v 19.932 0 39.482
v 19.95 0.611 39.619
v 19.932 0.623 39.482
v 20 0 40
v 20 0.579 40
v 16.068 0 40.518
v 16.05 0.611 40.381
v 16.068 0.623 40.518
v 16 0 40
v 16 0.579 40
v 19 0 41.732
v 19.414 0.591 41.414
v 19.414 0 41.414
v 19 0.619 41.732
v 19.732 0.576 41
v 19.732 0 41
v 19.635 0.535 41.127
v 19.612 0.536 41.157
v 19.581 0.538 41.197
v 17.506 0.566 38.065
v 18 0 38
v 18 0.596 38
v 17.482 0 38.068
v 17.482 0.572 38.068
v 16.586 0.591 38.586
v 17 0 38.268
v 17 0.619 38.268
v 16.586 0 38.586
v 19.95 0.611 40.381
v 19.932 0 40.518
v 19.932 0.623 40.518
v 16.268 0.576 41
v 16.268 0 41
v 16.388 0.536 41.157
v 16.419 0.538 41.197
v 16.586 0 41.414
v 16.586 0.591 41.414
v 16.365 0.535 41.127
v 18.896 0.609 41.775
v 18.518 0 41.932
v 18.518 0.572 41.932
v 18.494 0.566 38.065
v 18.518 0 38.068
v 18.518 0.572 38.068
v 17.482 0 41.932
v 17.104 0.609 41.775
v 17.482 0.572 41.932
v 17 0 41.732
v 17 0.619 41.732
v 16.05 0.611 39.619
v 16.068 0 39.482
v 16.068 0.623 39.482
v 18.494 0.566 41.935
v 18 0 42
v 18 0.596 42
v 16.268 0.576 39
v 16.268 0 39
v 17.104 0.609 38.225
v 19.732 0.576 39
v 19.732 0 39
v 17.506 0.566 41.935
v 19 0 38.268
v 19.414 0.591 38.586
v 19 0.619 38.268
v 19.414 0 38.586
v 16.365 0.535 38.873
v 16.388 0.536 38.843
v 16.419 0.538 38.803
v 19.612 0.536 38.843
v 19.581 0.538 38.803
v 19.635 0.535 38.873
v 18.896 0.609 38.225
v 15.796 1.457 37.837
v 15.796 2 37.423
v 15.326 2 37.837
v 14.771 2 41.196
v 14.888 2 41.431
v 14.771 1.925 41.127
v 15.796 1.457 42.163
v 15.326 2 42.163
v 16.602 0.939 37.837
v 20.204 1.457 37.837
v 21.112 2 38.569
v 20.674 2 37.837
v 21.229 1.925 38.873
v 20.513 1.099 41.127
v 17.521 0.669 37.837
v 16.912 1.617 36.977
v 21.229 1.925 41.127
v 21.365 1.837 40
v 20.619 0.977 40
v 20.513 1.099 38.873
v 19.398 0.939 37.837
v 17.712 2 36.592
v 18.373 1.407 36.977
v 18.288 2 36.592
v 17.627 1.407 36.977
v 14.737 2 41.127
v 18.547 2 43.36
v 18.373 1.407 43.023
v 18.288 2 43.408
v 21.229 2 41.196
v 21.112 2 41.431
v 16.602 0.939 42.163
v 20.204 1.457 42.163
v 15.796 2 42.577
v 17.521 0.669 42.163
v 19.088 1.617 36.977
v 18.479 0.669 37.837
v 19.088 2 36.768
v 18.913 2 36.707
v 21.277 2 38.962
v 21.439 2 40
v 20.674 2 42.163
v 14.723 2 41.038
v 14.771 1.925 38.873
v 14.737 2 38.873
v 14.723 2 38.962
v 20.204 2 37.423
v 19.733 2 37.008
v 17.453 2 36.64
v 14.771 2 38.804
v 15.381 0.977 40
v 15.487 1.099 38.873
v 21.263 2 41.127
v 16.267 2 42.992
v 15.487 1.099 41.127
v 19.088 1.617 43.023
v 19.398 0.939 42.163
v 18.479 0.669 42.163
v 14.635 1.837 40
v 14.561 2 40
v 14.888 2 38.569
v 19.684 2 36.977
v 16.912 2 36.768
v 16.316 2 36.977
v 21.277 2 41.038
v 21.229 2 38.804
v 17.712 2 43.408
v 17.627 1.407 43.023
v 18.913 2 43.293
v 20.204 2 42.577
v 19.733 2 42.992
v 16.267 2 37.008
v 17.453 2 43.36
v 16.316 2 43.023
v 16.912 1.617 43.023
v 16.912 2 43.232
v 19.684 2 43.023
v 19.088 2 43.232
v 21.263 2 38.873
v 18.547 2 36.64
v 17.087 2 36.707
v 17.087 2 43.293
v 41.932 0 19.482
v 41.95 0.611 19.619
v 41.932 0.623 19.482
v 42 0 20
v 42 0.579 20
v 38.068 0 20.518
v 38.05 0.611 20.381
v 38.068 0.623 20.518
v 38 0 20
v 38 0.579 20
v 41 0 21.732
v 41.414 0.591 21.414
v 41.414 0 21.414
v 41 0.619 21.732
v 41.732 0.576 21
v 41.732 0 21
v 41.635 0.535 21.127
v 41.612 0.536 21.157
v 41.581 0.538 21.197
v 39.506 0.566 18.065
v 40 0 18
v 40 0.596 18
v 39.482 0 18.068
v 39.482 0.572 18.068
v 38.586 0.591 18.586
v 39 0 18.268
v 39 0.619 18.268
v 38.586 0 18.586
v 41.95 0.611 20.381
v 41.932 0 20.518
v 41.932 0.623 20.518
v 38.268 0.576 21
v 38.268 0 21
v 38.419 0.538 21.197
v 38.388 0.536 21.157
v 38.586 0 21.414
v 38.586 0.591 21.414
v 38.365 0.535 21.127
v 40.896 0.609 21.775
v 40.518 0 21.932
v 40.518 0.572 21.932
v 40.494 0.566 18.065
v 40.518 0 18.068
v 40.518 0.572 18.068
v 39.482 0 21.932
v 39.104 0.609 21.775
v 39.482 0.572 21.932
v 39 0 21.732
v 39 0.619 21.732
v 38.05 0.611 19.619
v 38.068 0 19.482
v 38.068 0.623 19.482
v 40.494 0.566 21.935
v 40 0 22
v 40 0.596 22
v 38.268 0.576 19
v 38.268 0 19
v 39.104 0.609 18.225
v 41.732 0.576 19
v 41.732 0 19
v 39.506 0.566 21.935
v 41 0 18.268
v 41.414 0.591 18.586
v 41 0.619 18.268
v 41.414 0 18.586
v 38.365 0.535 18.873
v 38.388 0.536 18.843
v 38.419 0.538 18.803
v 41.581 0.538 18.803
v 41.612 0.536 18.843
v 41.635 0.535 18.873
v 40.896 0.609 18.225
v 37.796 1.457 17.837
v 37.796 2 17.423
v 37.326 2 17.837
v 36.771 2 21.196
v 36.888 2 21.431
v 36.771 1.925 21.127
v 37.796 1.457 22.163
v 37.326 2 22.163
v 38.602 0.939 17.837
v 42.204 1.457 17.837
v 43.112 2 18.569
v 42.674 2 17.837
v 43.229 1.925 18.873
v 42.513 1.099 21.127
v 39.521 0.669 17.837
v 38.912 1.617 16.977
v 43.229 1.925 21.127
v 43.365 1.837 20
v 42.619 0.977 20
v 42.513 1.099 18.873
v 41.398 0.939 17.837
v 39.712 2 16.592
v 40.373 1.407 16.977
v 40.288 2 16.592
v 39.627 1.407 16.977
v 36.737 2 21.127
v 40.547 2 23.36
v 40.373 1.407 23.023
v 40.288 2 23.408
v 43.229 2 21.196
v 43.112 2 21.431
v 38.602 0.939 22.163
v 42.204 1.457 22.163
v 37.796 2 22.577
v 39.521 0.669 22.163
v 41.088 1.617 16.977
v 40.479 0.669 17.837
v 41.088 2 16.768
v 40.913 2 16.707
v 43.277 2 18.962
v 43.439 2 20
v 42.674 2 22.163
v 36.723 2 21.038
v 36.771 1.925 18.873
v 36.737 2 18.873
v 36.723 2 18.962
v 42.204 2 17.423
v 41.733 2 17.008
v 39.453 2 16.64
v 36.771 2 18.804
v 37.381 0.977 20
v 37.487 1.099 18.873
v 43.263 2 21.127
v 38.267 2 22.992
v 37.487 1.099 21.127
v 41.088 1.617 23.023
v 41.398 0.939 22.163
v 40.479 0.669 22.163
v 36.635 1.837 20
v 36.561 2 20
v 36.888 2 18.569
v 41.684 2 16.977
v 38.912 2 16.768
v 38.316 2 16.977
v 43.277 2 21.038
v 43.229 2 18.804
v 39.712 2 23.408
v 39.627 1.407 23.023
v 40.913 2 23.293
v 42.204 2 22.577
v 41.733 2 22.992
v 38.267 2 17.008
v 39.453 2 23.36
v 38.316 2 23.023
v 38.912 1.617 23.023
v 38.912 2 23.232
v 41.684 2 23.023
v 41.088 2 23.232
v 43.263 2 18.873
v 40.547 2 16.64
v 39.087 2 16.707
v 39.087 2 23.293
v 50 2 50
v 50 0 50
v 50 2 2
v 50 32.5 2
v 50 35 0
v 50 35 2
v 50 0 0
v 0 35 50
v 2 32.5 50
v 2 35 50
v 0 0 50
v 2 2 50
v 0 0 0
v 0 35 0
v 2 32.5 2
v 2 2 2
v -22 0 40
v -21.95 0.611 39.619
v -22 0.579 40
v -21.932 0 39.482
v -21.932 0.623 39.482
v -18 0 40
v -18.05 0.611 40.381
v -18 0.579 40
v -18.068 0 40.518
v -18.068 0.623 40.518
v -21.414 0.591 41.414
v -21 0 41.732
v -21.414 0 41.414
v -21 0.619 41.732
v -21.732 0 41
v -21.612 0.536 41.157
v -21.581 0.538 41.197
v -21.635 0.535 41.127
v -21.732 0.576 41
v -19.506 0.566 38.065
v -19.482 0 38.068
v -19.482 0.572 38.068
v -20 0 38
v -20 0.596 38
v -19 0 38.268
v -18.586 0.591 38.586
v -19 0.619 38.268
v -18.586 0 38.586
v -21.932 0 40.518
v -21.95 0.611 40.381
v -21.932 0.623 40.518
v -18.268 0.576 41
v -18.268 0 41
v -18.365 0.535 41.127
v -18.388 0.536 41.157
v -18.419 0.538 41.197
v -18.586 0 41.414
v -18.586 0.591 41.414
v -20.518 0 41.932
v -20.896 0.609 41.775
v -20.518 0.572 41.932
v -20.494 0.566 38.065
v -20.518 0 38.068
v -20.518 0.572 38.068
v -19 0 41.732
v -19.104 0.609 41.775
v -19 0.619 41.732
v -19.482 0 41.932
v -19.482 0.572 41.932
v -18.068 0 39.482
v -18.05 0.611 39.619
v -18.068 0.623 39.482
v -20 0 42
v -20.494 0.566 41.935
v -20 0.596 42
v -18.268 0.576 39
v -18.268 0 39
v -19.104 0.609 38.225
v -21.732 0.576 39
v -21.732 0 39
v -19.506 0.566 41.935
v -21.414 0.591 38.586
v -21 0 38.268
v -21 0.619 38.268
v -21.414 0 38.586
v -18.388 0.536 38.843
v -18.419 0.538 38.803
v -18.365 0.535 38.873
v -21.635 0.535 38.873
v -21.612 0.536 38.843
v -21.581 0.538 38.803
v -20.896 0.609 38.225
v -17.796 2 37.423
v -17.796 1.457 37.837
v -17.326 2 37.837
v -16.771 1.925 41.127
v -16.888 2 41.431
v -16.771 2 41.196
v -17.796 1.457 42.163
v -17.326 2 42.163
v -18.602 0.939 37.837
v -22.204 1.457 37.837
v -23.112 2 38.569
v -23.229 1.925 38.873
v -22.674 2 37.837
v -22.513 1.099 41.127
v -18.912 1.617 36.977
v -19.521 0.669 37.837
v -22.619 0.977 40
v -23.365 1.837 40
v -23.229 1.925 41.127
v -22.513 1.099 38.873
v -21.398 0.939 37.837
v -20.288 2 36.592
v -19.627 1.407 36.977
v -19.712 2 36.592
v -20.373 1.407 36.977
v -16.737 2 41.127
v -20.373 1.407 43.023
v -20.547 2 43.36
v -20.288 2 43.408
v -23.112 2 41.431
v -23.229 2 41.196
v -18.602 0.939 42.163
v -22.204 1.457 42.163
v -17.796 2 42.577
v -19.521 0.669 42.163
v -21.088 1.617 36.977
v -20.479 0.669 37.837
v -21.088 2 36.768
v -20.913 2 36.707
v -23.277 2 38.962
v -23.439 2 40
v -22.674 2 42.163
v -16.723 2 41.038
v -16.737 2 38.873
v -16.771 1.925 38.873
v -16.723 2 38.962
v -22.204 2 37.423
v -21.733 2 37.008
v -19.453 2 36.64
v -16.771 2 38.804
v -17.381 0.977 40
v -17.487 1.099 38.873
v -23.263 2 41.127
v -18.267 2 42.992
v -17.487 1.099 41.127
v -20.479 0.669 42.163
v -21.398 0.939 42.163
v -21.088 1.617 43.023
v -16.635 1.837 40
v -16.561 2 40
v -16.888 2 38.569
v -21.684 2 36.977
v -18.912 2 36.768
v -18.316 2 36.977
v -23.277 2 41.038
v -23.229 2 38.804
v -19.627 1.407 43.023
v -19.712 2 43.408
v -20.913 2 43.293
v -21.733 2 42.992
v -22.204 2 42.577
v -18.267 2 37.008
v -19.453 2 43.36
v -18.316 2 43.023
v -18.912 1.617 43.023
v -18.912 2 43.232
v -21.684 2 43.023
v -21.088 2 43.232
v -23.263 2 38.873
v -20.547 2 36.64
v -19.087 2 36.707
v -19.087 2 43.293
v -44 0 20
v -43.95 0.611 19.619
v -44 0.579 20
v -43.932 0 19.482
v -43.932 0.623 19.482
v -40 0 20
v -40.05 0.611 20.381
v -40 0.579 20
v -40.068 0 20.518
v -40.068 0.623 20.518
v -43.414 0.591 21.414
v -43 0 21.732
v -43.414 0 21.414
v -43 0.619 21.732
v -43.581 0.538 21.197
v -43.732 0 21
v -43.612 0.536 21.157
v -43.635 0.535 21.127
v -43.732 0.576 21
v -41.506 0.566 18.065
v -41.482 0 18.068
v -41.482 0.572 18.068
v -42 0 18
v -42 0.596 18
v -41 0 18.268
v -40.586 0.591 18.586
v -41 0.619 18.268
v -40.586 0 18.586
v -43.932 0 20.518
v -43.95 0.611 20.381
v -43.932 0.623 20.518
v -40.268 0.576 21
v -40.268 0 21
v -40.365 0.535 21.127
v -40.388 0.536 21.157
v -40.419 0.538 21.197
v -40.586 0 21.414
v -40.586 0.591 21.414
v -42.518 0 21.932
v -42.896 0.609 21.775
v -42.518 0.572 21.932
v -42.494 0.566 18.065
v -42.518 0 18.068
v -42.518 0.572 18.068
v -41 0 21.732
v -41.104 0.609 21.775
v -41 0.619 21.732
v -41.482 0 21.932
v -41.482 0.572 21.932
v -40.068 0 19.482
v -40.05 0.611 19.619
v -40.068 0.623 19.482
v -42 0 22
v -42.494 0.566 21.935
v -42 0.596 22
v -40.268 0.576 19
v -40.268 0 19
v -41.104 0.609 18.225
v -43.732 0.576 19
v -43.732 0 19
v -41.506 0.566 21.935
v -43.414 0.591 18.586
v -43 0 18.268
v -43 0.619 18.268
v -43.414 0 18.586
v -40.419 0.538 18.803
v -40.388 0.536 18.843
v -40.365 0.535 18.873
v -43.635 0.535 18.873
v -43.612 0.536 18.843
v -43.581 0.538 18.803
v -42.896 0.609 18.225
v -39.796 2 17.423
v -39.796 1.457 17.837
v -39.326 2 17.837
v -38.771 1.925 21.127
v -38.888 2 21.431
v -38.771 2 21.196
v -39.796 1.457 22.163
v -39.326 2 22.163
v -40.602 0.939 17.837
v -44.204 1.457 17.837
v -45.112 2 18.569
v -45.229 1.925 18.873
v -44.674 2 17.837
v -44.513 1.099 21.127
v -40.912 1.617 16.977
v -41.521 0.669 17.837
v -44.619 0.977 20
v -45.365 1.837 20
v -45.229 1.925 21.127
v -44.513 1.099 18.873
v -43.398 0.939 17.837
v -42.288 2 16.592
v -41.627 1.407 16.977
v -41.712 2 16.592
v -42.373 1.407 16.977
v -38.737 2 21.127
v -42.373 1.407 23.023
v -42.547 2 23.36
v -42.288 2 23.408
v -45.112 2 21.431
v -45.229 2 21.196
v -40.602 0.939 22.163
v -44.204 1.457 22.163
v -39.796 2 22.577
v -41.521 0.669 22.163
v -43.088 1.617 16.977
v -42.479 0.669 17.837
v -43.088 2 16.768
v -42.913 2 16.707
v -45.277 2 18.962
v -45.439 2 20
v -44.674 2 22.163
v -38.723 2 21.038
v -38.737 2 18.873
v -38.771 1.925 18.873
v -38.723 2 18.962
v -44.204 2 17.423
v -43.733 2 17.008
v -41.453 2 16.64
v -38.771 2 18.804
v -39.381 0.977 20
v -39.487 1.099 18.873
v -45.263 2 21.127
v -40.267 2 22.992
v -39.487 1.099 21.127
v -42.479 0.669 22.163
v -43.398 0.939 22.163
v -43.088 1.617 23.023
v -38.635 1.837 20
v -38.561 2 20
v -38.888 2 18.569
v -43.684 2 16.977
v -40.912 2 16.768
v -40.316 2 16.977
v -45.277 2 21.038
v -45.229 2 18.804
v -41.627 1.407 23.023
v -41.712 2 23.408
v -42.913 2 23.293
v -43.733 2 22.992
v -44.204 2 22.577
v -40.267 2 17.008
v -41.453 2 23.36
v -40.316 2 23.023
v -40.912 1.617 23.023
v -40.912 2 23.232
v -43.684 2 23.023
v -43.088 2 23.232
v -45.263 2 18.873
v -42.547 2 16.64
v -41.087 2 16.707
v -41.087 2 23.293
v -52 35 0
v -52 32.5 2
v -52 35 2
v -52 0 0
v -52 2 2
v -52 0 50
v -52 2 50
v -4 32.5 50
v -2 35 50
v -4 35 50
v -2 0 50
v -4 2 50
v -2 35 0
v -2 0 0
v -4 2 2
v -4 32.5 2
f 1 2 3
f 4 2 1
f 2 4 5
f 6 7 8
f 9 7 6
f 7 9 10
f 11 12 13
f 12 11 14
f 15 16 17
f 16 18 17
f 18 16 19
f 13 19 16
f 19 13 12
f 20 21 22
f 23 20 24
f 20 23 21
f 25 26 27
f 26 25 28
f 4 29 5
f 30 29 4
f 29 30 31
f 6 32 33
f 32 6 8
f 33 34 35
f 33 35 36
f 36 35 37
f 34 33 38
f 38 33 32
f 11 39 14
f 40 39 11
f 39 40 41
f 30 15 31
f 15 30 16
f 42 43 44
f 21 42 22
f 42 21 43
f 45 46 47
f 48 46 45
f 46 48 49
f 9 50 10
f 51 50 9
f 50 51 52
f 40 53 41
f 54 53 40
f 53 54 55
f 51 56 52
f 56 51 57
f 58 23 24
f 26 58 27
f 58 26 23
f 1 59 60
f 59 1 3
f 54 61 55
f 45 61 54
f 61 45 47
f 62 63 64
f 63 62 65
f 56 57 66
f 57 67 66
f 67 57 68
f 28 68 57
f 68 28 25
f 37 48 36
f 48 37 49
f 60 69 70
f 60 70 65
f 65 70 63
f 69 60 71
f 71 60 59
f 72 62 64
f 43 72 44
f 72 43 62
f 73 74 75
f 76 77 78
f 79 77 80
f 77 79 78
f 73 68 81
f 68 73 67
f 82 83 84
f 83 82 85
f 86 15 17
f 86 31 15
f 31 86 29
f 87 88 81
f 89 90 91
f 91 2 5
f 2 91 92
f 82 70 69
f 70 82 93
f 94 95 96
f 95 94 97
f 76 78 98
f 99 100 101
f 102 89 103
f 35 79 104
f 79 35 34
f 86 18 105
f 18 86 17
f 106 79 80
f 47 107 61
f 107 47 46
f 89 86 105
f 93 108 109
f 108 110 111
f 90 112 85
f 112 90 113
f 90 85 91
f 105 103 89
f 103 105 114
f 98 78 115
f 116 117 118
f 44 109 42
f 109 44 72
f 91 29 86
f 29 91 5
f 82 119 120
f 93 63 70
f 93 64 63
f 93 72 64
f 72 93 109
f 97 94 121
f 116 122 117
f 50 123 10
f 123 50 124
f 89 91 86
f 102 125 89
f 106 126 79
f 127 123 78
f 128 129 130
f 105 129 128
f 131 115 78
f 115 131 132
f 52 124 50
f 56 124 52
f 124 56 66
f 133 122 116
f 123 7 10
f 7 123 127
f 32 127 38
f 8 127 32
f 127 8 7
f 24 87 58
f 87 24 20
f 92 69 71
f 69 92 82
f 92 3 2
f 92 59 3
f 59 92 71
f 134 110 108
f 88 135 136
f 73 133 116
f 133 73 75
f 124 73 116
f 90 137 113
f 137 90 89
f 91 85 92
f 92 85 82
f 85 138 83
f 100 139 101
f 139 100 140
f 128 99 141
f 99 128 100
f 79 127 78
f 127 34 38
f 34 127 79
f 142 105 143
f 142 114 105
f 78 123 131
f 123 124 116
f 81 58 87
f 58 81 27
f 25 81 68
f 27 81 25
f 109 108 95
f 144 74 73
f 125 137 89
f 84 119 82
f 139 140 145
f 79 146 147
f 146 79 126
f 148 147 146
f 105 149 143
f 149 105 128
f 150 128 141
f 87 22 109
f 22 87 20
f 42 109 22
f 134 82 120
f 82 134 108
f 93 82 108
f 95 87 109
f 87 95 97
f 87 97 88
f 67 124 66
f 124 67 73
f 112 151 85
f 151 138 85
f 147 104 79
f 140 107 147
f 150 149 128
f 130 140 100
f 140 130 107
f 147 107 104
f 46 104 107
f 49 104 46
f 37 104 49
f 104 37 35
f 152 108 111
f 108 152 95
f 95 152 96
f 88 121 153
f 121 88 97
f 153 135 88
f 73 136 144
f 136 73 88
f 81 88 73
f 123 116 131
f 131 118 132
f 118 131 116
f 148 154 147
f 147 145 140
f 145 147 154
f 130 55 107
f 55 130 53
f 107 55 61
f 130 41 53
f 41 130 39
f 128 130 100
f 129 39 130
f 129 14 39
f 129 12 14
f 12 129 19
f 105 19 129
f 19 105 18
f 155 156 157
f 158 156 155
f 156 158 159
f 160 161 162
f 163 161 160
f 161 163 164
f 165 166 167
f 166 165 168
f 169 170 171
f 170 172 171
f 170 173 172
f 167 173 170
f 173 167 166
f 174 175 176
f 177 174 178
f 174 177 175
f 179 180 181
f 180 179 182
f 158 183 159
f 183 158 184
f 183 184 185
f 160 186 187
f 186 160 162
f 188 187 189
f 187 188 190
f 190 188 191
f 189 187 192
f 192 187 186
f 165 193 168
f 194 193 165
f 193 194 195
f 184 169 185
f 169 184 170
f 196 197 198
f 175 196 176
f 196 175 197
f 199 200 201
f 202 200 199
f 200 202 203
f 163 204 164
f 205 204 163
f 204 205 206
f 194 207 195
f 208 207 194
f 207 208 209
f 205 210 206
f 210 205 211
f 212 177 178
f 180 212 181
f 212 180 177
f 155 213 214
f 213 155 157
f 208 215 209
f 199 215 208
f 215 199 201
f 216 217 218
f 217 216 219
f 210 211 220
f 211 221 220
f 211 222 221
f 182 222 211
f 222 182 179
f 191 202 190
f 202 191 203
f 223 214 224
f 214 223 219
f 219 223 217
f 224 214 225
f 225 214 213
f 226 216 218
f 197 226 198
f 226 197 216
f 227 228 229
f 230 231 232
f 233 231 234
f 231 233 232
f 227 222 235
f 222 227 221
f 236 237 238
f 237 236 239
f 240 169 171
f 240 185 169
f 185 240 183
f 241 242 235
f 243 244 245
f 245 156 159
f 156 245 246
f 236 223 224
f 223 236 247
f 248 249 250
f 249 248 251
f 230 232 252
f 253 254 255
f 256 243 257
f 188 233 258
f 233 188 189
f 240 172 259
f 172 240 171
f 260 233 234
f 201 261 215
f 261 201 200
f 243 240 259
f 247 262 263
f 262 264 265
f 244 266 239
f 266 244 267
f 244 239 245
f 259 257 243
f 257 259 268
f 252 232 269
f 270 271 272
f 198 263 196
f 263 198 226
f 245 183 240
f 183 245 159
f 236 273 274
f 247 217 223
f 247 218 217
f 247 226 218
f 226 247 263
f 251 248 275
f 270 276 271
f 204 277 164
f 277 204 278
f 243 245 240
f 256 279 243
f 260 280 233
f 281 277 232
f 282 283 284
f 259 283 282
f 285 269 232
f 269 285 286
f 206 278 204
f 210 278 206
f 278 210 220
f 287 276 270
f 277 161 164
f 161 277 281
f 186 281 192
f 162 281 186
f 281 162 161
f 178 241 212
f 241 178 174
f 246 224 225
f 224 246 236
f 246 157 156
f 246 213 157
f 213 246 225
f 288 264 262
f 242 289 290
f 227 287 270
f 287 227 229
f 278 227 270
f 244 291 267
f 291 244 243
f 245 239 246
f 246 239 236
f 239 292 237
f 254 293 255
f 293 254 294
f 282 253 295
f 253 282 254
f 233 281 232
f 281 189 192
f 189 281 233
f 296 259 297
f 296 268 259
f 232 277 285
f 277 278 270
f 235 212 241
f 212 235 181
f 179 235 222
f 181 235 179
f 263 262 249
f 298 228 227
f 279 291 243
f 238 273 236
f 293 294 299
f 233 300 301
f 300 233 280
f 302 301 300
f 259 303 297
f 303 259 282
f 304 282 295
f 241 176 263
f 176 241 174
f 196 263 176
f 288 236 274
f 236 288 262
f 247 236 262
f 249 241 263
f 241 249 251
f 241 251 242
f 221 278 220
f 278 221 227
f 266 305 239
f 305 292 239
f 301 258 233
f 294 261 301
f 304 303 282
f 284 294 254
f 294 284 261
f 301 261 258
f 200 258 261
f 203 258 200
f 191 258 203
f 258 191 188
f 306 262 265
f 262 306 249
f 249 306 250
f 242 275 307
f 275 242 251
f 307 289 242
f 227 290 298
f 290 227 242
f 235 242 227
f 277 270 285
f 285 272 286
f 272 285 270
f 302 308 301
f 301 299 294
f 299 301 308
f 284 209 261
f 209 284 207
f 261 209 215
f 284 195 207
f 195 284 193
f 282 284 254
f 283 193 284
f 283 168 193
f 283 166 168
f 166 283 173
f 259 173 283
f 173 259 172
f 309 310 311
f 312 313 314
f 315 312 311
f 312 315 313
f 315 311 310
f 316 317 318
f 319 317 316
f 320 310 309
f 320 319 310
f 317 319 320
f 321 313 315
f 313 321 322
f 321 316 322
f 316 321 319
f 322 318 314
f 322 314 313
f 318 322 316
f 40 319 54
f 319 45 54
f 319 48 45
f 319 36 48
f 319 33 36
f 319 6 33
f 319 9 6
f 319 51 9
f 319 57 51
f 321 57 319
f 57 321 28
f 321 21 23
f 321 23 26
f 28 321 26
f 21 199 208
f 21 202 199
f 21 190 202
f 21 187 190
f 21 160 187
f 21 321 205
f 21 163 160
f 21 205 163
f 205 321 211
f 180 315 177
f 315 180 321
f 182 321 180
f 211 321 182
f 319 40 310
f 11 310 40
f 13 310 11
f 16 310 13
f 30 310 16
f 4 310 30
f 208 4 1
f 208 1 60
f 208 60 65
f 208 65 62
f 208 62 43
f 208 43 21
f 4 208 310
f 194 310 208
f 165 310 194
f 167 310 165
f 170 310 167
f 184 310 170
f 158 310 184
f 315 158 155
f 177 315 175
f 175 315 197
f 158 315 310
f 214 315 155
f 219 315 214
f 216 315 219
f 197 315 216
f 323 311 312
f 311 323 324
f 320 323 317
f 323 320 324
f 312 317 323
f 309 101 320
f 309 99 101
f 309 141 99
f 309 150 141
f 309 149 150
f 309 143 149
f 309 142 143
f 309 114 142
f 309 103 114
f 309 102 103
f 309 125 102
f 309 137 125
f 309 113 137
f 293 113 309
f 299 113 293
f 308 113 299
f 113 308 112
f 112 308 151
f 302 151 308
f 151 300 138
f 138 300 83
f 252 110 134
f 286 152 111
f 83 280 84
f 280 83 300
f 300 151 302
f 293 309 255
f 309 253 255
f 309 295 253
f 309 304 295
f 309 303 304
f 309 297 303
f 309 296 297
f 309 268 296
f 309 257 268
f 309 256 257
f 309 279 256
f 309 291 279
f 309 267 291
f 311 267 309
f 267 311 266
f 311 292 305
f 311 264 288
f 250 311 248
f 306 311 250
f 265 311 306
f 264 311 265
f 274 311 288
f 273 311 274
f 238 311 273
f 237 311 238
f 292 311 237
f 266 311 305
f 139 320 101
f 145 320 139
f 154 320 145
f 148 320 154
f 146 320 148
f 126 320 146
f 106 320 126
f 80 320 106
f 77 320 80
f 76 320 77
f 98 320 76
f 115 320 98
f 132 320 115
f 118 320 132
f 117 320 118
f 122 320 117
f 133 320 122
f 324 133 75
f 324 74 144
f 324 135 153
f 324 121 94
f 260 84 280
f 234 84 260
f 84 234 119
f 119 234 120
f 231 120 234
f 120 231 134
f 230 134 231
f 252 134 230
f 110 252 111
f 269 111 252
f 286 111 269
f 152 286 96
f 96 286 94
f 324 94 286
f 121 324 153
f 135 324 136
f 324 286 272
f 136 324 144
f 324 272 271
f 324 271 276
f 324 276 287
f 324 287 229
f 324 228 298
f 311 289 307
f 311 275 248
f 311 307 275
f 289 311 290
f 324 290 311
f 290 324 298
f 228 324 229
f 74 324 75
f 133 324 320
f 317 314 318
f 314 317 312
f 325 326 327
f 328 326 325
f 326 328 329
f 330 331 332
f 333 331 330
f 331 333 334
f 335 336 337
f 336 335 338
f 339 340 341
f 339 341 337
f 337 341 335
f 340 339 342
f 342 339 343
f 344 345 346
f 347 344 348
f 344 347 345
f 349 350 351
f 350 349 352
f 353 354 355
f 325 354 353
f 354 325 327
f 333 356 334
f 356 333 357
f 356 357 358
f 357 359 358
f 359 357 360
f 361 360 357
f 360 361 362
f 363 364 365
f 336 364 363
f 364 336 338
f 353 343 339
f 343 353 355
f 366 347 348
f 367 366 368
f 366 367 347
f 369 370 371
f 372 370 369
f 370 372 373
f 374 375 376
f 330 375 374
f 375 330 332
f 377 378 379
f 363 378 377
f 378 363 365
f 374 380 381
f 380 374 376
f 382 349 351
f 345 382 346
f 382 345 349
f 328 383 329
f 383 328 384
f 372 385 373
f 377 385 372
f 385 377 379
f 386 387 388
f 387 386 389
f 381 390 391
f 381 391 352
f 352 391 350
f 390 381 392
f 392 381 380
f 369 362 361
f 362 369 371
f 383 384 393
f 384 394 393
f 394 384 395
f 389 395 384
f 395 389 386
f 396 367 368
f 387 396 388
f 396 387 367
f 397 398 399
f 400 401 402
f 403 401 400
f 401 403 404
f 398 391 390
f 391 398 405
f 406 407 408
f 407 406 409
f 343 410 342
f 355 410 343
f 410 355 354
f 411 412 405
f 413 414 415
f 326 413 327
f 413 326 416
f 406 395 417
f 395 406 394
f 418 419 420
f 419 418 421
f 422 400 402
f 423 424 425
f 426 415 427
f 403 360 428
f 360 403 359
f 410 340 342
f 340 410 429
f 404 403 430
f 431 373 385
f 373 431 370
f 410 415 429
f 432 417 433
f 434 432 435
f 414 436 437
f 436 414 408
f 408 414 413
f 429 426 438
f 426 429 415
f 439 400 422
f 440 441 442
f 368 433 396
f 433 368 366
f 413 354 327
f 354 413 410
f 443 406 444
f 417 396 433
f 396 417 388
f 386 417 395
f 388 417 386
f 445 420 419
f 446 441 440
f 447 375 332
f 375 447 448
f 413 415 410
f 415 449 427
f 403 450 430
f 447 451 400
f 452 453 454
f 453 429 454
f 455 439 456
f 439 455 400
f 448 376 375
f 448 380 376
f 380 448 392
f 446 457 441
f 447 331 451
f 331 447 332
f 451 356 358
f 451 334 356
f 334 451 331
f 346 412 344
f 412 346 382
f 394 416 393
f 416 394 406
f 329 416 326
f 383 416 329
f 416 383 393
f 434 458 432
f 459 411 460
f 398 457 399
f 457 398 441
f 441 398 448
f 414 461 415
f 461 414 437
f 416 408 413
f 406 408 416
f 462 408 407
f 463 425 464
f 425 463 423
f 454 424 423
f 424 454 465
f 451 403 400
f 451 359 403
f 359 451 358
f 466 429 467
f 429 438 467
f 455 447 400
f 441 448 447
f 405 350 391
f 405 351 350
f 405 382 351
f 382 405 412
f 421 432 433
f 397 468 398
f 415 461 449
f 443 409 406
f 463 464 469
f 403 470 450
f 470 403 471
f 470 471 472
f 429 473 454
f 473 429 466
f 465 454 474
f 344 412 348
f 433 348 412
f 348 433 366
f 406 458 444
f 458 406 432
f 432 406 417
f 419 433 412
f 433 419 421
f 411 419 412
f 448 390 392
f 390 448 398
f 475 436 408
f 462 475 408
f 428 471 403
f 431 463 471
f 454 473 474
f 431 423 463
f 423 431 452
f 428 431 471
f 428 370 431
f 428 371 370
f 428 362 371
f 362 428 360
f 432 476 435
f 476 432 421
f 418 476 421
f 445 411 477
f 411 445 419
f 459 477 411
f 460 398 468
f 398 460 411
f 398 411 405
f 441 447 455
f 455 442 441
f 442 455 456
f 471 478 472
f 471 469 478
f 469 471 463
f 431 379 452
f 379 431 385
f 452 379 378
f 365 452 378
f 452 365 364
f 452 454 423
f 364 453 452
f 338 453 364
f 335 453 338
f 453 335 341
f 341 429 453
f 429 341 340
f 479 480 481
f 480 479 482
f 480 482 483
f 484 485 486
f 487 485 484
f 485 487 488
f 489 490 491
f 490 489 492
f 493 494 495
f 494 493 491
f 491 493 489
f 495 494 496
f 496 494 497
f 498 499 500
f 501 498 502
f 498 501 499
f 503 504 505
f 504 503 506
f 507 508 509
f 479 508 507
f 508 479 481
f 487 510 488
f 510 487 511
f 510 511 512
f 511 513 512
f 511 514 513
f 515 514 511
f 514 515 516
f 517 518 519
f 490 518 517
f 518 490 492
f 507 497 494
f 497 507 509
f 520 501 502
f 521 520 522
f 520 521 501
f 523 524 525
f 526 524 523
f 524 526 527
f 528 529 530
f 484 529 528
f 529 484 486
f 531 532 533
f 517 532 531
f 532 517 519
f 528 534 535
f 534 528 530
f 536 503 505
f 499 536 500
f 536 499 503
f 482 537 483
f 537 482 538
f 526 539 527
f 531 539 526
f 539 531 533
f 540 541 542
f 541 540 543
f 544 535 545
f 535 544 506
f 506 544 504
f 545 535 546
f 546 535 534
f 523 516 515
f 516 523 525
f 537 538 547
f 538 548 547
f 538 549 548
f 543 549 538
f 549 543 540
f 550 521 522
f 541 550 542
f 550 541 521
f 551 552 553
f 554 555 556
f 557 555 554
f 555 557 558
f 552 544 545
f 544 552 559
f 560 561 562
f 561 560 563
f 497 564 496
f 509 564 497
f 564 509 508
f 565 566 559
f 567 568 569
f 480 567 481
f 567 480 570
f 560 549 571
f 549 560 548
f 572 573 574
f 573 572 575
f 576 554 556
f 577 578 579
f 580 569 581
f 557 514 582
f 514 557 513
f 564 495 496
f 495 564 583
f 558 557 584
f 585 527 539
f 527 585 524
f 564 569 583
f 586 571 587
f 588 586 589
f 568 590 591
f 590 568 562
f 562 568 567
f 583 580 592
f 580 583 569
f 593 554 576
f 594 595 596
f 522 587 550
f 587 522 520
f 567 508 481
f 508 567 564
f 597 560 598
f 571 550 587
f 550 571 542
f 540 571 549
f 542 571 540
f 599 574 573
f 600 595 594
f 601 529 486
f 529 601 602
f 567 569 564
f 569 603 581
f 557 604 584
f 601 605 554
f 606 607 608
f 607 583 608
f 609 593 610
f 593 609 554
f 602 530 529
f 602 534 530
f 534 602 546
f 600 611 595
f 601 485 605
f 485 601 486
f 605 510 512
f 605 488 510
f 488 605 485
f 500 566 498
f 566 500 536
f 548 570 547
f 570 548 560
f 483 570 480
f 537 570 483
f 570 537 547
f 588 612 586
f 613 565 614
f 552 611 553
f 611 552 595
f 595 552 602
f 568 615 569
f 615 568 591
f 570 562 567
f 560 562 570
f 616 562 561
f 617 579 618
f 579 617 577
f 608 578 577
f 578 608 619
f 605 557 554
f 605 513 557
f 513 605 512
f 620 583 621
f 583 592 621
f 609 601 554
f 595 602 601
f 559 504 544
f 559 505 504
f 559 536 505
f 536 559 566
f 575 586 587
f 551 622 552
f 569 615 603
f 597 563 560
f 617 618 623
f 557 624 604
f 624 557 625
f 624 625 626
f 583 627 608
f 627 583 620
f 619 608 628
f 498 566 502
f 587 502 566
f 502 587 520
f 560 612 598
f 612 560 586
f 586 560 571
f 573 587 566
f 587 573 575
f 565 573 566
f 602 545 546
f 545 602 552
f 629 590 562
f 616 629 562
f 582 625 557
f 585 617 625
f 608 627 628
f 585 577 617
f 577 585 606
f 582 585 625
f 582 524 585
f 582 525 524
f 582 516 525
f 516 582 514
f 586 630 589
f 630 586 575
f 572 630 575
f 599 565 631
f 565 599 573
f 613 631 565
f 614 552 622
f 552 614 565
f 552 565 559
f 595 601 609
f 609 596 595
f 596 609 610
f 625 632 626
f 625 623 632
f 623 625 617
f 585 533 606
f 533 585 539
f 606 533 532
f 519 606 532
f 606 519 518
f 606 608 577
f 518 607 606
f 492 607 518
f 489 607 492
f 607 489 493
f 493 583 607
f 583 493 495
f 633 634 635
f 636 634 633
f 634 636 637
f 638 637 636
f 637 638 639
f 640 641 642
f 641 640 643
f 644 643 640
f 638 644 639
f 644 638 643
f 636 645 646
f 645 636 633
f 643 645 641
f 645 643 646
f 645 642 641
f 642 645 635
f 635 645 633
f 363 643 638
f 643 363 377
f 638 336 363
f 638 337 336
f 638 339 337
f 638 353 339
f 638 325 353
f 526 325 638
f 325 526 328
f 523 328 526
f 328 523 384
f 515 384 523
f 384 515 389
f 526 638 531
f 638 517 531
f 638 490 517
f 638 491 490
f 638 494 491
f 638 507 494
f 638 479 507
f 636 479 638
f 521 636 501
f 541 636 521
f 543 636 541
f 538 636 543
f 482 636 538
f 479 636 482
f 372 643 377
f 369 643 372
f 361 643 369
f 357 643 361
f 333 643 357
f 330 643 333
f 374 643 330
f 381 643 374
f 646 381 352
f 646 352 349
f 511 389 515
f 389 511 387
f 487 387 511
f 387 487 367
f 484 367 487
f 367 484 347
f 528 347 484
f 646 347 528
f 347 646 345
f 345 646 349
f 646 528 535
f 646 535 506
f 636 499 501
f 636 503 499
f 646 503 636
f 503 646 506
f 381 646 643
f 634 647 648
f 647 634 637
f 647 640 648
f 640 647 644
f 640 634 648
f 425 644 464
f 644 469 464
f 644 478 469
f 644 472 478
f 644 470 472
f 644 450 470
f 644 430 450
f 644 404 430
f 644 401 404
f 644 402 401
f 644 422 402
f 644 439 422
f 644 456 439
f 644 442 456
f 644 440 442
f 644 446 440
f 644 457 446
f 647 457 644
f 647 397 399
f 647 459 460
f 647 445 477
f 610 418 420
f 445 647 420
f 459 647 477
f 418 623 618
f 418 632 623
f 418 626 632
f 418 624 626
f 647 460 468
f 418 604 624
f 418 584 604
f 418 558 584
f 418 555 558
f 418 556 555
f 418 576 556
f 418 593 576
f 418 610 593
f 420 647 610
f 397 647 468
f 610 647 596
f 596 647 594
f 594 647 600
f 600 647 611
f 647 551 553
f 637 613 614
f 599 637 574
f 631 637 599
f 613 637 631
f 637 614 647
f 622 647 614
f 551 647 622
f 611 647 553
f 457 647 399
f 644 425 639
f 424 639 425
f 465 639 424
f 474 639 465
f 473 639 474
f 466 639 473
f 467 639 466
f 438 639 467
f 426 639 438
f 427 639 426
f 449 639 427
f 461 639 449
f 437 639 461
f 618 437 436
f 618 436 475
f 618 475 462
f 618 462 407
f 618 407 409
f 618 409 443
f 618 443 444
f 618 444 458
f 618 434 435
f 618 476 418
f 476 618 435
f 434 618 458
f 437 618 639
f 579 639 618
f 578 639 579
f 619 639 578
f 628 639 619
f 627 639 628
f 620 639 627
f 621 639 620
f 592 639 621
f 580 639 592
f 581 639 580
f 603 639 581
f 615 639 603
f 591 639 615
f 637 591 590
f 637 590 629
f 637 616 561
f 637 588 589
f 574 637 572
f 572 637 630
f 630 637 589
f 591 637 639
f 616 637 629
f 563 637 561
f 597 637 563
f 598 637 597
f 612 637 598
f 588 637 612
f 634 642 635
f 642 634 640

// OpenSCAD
staerke = 2;
spiel = 1;
buchbreite  = 30;
aussenbreite = buchbreite + 2 * staerke + spiel;
xoffset1 = 23;
zoffset1 = 20;
xoffset2 = 45;
zoffset2 = 40;

module hole(){
    translate([-5,0,0])
    rotate([90,0,0])
    cylinder(h=200,d=4,$fn=24,center=true);
    translate([-5,4,0])
    sphere(d=8,$fn=22);
}

module element(){
difference(){
    cube([50,aussenbreite,50]);
    translate([staerke, staerke, staerke])
        cube([50,buchbreite+spiel/2,50]);
    translate([0, buchbreite+staerke+.49, 50+staerke])
        rotate([0,45,0])
            cube([150,aussenbreite,50]);
//    translate([xoffset1,0,zoffset1])
//        hole();
    translate([xoffset1,0,zoffset2])
        hole();
    translate([xoffset2,0,zoffset1])
        hole();
//    translate([xoffset2,0,zoffset2])
//        hole();
}
}

element();

translate([-2,0,0])
mirror([[0,1,0]])
    element();
    
